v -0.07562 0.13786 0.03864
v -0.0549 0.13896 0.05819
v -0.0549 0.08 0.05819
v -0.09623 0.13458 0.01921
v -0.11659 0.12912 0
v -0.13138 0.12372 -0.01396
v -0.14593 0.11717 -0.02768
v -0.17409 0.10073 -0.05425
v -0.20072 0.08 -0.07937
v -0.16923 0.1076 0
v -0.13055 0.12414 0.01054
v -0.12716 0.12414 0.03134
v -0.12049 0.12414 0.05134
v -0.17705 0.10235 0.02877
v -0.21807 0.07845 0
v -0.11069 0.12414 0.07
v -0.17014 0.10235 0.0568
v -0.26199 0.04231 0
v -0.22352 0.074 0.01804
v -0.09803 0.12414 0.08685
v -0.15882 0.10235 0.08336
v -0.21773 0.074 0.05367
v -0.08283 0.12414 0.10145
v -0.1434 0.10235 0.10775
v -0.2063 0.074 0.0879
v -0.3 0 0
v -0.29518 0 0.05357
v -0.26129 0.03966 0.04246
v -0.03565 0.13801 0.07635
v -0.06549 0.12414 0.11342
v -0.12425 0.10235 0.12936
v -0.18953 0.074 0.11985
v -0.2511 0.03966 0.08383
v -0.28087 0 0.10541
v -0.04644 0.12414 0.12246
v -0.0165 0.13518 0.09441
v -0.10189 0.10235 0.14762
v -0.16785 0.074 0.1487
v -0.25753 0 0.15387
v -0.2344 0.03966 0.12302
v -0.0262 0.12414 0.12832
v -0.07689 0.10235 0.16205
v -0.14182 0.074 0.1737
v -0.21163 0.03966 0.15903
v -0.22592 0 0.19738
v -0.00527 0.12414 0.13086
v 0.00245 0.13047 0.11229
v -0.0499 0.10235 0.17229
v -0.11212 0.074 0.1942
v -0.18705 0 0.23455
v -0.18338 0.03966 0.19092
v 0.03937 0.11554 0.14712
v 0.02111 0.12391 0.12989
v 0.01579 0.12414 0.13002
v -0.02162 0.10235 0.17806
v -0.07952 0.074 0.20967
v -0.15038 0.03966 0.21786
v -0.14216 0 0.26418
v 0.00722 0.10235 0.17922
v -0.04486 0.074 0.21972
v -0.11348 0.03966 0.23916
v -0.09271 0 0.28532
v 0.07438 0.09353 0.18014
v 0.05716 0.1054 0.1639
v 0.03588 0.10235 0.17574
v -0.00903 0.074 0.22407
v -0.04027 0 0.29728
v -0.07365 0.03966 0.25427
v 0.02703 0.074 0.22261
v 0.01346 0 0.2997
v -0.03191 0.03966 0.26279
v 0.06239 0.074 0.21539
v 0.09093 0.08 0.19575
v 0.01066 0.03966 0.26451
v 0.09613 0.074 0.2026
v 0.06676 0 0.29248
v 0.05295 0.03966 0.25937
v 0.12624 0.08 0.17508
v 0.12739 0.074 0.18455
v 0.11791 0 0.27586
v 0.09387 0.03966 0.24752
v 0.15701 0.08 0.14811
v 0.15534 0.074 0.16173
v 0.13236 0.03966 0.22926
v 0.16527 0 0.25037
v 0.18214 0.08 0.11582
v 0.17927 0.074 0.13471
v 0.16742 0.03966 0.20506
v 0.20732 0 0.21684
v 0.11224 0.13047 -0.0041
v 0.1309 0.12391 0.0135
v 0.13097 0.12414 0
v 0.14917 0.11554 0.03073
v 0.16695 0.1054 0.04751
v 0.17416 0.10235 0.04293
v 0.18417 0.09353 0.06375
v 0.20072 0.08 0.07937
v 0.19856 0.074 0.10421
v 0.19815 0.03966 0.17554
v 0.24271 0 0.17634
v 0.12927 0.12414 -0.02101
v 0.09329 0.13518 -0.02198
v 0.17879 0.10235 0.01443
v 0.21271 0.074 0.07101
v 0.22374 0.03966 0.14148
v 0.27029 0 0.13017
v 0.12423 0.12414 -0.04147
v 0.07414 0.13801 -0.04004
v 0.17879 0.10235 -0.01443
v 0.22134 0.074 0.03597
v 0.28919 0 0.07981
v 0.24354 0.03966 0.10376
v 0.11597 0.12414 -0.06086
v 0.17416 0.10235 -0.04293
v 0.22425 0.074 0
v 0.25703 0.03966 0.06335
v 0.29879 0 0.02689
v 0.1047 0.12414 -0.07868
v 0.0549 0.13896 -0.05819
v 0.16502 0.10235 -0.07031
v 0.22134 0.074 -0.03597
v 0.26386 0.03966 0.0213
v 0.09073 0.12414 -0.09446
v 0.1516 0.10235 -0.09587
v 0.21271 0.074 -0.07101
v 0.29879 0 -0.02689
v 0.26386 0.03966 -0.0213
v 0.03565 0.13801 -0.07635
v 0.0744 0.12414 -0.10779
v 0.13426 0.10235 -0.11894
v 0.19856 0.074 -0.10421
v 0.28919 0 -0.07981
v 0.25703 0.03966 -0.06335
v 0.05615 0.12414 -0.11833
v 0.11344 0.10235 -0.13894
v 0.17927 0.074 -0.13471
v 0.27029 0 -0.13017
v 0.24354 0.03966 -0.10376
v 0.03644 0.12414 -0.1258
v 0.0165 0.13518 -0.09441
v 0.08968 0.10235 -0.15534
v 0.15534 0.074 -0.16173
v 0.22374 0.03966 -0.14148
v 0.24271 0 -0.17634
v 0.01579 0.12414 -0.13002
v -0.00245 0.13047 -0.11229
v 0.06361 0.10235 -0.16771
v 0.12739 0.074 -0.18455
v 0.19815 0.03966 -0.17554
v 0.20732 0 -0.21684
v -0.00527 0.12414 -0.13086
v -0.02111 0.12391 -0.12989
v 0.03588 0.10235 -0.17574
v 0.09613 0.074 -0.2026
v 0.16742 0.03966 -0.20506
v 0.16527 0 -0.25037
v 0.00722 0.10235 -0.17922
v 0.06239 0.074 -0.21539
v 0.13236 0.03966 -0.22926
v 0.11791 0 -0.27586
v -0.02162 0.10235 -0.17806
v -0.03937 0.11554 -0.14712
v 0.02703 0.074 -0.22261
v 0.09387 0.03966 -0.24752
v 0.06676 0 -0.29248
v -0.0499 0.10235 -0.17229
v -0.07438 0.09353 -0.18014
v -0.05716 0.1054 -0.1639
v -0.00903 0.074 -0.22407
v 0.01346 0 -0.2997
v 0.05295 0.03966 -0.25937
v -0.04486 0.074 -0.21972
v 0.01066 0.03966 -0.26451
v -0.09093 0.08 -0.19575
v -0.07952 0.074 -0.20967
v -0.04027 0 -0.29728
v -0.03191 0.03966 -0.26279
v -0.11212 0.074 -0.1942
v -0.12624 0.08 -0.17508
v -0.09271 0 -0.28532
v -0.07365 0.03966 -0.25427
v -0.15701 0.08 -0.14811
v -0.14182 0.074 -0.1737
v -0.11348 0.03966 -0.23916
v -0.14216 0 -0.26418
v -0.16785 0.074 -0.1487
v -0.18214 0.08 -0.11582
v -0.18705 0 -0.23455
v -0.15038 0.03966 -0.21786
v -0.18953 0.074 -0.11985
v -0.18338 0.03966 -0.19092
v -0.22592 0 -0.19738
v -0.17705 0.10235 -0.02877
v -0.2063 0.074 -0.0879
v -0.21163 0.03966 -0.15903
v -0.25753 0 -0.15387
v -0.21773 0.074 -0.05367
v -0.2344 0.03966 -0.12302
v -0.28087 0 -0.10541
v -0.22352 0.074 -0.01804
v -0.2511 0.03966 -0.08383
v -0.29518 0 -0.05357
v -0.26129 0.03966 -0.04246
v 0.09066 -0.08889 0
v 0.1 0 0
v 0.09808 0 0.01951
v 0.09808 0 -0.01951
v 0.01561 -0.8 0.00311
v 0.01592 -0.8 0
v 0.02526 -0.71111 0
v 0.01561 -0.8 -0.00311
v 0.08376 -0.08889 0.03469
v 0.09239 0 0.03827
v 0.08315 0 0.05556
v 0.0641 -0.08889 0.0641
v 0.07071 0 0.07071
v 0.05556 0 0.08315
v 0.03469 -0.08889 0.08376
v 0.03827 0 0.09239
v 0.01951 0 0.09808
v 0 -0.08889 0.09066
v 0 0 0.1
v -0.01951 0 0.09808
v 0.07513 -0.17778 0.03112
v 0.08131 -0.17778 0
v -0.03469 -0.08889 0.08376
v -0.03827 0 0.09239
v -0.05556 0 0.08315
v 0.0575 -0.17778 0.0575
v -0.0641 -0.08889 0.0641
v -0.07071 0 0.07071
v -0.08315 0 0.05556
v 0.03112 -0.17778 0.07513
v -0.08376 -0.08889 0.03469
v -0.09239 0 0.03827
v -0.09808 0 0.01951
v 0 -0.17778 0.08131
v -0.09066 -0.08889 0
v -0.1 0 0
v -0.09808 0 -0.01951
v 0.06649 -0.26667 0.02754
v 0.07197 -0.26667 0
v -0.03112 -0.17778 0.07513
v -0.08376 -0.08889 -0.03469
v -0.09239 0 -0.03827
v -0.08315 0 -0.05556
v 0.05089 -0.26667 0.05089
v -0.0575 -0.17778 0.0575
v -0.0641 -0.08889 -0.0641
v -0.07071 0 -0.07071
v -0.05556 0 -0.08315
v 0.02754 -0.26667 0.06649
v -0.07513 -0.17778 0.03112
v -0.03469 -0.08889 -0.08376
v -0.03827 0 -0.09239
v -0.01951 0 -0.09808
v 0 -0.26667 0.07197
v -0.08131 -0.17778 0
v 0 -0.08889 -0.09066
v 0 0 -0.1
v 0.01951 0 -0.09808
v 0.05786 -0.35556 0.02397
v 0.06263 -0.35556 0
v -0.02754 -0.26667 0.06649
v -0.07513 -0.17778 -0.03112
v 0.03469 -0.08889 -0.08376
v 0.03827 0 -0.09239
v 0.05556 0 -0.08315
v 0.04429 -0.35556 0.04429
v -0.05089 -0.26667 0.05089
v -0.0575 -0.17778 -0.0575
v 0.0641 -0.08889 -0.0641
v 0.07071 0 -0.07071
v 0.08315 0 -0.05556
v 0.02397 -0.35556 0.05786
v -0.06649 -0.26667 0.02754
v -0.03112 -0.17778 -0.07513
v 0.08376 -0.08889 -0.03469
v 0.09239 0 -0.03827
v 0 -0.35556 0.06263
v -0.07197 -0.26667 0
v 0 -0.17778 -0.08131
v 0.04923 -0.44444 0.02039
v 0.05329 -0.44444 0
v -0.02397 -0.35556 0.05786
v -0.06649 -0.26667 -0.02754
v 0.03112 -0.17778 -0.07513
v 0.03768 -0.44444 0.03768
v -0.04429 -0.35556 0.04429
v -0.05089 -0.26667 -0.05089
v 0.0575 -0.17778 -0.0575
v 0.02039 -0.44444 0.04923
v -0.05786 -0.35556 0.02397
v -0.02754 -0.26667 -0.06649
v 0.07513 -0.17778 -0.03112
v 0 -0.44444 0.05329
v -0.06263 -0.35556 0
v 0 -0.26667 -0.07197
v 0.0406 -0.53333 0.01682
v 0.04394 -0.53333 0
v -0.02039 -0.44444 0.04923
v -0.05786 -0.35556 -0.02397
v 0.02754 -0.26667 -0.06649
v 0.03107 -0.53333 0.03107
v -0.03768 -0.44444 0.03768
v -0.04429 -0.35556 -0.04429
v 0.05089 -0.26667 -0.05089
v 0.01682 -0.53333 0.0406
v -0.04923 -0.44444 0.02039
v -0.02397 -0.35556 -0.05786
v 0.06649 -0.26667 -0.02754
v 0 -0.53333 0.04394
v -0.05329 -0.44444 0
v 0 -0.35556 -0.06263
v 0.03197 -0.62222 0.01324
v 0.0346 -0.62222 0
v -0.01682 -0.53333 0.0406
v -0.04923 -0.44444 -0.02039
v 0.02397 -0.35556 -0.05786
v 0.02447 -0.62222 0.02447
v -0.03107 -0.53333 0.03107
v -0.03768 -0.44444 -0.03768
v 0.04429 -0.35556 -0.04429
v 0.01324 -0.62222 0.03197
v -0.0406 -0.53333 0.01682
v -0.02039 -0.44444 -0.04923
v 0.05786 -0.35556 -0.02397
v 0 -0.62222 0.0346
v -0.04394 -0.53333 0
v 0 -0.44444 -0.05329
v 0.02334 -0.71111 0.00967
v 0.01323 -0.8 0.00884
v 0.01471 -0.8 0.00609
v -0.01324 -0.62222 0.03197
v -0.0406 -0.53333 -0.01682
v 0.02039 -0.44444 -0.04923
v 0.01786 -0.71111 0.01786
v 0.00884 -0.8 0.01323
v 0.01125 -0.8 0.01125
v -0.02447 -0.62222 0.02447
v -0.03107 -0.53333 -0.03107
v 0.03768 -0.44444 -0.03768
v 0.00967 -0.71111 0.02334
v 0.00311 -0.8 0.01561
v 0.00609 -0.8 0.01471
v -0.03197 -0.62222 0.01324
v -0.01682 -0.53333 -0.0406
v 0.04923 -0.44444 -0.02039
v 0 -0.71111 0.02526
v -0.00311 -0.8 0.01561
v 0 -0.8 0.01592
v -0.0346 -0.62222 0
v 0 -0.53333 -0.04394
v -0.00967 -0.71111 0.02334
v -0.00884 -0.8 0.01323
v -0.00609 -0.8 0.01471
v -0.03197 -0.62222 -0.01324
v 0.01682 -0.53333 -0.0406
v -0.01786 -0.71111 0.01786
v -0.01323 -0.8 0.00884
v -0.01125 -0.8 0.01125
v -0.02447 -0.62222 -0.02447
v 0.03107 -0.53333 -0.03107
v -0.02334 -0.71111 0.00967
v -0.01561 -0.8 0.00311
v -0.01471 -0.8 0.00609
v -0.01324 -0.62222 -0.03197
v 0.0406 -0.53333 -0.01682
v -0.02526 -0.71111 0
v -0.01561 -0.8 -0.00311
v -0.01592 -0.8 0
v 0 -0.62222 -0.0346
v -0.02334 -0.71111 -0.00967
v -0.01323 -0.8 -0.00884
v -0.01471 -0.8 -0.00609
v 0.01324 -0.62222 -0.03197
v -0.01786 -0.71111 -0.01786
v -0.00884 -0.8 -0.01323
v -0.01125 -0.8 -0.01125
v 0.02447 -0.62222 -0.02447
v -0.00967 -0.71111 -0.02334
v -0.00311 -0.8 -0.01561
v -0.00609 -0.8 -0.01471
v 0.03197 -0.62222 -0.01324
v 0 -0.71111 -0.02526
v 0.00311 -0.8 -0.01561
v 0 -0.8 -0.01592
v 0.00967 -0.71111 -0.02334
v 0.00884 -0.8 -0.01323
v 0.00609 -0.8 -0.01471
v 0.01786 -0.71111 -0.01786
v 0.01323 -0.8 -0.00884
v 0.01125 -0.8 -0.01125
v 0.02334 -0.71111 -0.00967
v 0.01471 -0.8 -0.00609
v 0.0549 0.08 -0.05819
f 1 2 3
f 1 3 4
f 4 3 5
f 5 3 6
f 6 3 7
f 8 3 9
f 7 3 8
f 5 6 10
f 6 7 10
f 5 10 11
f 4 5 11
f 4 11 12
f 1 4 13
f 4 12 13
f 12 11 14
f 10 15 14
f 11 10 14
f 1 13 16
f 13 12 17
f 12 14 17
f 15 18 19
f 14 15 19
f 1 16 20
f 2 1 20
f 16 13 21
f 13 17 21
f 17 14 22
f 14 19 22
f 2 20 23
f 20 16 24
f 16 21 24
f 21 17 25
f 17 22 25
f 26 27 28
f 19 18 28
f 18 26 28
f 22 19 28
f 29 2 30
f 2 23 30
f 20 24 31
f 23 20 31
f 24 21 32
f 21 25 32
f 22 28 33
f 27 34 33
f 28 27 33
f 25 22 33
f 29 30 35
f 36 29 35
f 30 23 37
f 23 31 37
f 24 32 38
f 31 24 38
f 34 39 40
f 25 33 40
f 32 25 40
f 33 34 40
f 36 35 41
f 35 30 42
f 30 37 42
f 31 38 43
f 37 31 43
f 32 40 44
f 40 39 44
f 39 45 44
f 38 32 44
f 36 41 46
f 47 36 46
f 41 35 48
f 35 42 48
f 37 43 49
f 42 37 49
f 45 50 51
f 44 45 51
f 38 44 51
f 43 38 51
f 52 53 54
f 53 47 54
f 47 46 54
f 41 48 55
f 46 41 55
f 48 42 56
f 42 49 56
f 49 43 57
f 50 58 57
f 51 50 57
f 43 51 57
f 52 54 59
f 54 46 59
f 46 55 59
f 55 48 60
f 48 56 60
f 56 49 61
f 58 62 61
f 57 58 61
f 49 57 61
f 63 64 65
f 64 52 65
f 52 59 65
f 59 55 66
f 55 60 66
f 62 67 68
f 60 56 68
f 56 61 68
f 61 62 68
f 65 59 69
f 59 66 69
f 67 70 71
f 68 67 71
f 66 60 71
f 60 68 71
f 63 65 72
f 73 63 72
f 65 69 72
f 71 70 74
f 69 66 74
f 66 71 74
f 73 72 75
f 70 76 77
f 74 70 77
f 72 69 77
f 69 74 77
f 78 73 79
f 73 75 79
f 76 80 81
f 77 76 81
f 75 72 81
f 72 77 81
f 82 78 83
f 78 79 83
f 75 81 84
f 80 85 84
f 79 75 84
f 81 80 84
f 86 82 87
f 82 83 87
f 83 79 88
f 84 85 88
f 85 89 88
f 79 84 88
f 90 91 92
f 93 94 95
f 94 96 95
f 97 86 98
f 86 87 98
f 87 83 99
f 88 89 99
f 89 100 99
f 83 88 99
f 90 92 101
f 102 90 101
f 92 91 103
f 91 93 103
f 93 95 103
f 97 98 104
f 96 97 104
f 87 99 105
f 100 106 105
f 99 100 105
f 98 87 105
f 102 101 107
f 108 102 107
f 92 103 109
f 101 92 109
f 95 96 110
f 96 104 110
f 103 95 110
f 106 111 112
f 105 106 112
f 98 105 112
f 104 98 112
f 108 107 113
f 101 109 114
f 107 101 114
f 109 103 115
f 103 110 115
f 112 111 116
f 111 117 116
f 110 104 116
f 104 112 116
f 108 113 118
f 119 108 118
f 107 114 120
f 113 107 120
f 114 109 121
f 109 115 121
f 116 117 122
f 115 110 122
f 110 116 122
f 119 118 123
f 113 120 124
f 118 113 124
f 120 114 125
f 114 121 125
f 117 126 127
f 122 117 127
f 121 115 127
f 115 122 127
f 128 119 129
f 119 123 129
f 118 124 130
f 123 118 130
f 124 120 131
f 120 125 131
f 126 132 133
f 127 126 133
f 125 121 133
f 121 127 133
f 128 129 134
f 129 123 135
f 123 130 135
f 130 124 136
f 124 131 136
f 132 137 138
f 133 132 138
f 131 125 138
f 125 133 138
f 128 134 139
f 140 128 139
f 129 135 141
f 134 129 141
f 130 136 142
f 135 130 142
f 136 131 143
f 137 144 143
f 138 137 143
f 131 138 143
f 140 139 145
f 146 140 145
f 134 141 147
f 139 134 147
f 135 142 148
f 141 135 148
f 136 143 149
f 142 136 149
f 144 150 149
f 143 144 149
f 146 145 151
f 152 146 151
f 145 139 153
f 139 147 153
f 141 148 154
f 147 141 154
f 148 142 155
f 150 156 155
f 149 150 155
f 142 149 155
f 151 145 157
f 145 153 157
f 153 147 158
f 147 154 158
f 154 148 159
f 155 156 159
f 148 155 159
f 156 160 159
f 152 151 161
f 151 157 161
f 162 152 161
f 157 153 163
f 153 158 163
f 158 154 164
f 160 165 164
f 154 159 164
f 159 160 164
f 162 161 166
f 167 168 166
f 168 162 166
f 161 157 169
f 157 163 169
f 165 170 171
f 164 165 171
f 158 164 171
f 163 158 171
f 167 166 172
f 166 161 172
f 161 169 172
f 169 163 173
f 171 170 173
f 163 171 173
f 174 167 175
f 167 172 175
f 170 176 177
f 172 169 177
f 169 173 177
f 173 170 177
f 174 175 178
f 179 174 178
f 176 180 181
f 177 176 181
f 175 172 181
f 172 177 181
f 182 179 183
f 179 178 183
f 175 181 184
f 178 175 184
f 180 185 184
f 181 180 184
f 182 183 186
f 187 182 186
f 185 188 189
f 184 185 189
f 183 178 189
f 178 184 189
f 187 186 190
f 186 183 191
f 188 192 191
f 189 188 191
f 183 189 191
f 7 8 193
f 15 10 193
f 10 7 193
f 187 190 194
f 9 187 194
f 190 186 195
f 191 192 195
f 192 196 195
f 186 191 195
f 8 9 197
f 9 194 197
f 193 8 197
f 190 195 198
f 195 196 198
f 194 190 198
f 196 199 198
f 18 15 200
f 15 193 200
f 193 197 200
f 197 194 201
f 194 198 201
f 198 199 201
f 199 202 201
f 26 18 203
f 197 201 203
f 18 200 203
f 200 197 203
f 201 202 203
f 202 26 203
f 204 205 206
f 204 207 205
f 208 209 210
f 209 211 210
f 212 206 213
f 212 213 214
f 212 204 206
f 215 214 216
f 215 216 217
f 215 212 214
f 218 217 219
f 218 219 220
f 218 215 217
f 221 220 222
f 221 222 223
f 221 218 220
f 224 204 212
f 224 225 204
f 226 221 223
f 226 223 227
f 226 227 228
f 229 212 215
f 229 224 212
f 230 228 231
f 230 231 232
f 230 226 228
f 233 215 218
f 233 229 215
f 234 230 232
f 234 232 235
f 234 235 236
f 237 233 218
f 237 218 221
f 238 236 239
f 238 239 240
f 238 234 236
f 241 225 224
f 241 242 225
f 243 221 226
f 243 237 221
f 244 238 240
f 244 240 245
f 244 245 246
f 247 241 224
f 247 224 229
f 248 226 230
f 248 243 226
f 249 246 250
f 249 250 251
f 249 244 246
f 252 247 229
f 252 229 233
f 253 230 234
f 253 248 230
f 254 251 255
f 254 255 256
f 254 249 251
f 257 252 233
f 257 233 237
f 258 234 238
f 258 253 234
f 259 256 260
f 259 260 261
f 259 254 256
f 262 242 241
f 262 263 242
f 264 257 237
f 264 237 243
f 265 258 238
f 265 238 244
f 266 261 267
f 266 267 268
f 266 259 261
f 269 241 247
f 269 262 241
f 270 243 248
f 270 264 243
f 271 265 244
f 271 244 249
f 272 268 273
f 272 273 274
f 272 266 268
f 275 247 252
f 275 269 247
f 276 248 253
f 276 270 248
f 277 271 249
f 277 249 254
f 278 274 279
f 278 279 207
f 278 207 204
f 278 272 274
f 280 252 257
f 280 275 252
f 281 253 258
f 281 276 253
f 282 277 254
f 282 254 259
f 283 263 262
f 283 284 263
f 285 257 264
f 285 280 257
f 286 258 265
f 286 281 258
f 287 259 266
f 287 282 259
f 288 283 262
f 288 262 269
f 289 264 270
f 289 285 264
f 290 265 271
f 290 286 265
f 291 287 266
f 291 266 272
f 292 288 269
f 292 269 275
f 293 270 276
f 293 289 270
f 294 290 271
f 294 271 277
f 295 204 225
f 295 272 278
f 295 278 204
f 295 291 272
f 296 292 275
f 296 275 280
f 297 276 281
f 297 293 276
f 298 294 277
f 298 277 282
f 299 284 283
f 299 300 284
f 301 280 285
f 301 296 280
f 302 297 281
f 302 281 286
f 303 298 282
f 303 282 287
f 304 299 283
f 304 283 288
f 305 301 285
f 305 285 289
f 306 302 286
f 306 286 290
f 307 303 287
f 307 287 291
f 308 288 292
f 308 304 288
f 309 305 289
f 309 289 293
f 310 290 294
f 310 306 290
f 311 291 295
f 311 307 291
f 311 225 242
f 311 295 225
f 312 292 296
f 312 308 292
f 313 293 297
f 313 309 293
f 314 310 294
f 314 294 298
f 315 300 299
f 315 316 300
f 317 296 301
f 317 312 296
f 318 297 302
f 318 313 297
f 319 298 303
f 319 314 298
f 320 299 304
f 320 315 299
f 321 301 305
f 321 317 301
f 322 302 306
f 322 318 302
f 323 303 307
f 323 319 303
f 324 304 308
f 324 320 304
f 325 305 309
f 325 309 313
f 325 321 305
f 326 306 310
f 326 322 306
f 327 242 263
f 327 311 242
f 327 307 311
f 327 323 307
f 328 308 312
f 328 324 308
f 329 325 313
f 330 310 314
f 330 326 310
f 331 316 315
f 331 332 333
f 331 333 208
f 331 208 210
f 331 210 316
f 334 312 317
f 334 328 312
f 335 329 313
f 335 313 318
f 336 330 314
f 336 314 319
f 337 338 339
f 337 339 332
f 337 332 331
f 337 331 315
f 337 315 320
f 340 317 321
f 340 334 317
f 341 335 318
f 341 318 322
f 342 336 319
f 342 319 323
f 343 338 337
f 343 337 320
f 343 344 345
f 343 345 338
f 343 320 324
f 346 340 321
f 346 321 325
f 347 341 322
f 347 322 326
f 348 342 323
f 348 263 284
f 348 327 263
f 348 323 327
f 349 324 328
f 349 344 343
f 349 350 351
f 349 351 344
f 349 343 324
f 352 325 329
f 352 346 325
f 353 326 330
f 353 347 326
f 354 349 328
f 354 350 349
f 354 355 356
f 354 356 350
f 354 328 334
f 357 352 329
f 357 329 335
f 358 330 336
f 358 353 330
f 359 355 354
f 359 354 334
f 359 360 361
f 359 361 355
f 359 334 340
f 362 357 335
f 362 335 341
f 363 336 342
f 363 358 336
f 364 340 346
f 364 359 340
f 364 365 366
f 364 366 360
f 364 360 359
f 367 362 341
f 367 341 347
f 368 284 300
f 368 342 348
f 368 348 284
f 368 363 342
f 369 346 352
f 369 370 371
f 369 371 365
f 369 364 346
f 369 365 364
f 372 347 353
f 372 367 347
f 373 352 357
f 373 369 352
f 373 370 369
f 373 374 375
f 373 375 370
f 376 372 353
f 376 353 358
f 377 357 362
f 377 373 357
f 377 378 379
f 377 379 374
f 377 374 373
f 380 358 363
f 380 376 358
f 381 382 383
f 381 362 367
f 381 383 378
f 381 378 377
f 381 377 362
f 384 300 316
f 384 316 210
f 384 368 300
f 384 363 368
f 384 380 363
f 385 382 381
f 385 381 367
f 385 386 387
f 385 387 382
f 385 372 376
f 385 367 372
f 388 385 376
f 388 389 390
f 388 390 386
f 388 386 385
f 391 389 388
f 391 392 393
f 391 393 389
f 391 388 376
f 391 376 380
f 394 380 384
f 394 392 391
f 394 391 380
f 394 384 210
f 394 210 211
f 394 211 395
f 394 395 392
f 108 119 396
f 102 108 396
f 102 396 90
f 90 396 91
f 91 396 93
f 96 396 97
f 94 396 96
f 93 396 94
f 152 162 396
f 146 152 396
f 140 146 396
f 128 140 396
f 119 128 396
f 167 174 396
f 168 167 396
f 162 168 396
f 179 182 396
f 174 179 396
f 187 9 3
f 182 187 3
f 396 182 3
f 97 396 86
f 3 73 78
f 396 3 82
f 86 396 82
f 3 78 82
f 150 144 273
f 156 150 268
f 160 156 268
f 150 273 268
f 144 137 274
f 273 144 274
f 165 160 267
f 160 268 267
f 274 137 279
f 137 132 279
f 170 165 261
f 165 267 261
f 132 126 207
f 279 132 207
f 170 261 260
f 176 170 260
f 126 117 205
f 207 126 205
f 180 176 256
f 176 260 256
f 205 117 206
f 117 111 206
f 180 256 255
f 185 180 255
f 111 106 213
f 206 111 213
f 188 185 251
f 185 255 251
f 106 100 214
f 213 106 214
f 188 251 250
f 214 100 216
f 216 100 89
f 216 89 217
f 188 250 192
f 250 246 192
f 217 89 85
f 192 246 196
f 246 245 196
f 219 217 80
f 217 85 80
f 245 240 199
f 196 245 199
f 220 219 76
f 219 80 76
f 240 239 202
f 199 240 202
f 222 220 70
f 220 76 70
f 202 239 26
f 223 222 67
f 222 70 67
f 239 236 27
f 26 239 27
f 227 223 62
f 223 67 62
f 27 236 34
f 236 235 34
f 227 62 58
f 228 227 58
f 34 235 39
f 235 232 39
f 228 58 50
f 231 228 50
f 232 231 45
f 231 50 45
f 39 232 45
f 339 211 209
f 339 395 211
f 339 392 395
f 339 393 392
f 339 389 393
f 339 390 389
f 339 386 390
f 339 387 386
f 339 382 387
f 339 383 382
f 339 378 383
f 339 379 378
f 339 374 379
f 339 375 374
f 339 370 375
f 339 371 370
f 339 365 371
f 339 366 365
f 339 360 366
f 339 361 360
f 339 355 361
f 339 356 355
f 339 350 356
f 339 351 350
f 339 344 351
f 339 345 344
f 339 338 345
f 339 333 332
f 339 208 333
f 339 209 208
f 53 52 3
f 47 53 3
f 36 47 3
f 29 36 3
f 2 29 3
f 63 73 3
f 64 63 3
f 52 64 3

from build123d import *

# Parameters (mm, degrees)
SKETCH_3_R          = 0.1
EXTRUDE_1_DEPTH     = 0.8
EXTRUDE_1_TAPER     = 6
CUT_EXTRUDE_1_DEPTH = 5


with BuildPart() as part:
    # 草图2 one side → 旋转1 (revolve)
    with BuildSketch(Plane.XY):
        with BuildLine():
            Line((0, 0), (0, 0.147503795))
            ThreePointArc((0, 0.147503795), (-0.167150658, 0.108633694), (-0.3, 0))
            Line((-0.3, 0), (0, 0))
        make_face()
    revolve(axis=Axis((0, -0.078044802, 0), (0, 1, 0)))

    # 草图3 → 凸台-拉伸1 (add)
    with BuildSketch(Plane.XZ):
        Circle(SKETCH_3_R)
    extrude(amount=EXTRUDE_1_DEPTH, taper=EXTRUDE_1_TAPER)

    # 草图8 → 切除-拉伸1 (cut)
    with BuildSketch(Plane.XZ.offset(-0.08)):
        Polygon((-0.248199097, -0.234130992), (0, 0), (0.251445487, 0.237193374), (0.196550222, 0.295387102), (-0.054895265, 0.058193727), (-0.303094362, -0.175937265), align=None)
        Polygon((0.251445487, 0.237193374), (0, 0), (-0.248199097, -0.234130992), (-0.193303832, -0.29232472), (0.054895265, -0.058193727), (0.306340752, 0.178999647), align=None)
    extrude(amount=-CUT_EXTRUDE_1_DEPTH, mode=Mode.SUBTRACT)


solid = part.part
